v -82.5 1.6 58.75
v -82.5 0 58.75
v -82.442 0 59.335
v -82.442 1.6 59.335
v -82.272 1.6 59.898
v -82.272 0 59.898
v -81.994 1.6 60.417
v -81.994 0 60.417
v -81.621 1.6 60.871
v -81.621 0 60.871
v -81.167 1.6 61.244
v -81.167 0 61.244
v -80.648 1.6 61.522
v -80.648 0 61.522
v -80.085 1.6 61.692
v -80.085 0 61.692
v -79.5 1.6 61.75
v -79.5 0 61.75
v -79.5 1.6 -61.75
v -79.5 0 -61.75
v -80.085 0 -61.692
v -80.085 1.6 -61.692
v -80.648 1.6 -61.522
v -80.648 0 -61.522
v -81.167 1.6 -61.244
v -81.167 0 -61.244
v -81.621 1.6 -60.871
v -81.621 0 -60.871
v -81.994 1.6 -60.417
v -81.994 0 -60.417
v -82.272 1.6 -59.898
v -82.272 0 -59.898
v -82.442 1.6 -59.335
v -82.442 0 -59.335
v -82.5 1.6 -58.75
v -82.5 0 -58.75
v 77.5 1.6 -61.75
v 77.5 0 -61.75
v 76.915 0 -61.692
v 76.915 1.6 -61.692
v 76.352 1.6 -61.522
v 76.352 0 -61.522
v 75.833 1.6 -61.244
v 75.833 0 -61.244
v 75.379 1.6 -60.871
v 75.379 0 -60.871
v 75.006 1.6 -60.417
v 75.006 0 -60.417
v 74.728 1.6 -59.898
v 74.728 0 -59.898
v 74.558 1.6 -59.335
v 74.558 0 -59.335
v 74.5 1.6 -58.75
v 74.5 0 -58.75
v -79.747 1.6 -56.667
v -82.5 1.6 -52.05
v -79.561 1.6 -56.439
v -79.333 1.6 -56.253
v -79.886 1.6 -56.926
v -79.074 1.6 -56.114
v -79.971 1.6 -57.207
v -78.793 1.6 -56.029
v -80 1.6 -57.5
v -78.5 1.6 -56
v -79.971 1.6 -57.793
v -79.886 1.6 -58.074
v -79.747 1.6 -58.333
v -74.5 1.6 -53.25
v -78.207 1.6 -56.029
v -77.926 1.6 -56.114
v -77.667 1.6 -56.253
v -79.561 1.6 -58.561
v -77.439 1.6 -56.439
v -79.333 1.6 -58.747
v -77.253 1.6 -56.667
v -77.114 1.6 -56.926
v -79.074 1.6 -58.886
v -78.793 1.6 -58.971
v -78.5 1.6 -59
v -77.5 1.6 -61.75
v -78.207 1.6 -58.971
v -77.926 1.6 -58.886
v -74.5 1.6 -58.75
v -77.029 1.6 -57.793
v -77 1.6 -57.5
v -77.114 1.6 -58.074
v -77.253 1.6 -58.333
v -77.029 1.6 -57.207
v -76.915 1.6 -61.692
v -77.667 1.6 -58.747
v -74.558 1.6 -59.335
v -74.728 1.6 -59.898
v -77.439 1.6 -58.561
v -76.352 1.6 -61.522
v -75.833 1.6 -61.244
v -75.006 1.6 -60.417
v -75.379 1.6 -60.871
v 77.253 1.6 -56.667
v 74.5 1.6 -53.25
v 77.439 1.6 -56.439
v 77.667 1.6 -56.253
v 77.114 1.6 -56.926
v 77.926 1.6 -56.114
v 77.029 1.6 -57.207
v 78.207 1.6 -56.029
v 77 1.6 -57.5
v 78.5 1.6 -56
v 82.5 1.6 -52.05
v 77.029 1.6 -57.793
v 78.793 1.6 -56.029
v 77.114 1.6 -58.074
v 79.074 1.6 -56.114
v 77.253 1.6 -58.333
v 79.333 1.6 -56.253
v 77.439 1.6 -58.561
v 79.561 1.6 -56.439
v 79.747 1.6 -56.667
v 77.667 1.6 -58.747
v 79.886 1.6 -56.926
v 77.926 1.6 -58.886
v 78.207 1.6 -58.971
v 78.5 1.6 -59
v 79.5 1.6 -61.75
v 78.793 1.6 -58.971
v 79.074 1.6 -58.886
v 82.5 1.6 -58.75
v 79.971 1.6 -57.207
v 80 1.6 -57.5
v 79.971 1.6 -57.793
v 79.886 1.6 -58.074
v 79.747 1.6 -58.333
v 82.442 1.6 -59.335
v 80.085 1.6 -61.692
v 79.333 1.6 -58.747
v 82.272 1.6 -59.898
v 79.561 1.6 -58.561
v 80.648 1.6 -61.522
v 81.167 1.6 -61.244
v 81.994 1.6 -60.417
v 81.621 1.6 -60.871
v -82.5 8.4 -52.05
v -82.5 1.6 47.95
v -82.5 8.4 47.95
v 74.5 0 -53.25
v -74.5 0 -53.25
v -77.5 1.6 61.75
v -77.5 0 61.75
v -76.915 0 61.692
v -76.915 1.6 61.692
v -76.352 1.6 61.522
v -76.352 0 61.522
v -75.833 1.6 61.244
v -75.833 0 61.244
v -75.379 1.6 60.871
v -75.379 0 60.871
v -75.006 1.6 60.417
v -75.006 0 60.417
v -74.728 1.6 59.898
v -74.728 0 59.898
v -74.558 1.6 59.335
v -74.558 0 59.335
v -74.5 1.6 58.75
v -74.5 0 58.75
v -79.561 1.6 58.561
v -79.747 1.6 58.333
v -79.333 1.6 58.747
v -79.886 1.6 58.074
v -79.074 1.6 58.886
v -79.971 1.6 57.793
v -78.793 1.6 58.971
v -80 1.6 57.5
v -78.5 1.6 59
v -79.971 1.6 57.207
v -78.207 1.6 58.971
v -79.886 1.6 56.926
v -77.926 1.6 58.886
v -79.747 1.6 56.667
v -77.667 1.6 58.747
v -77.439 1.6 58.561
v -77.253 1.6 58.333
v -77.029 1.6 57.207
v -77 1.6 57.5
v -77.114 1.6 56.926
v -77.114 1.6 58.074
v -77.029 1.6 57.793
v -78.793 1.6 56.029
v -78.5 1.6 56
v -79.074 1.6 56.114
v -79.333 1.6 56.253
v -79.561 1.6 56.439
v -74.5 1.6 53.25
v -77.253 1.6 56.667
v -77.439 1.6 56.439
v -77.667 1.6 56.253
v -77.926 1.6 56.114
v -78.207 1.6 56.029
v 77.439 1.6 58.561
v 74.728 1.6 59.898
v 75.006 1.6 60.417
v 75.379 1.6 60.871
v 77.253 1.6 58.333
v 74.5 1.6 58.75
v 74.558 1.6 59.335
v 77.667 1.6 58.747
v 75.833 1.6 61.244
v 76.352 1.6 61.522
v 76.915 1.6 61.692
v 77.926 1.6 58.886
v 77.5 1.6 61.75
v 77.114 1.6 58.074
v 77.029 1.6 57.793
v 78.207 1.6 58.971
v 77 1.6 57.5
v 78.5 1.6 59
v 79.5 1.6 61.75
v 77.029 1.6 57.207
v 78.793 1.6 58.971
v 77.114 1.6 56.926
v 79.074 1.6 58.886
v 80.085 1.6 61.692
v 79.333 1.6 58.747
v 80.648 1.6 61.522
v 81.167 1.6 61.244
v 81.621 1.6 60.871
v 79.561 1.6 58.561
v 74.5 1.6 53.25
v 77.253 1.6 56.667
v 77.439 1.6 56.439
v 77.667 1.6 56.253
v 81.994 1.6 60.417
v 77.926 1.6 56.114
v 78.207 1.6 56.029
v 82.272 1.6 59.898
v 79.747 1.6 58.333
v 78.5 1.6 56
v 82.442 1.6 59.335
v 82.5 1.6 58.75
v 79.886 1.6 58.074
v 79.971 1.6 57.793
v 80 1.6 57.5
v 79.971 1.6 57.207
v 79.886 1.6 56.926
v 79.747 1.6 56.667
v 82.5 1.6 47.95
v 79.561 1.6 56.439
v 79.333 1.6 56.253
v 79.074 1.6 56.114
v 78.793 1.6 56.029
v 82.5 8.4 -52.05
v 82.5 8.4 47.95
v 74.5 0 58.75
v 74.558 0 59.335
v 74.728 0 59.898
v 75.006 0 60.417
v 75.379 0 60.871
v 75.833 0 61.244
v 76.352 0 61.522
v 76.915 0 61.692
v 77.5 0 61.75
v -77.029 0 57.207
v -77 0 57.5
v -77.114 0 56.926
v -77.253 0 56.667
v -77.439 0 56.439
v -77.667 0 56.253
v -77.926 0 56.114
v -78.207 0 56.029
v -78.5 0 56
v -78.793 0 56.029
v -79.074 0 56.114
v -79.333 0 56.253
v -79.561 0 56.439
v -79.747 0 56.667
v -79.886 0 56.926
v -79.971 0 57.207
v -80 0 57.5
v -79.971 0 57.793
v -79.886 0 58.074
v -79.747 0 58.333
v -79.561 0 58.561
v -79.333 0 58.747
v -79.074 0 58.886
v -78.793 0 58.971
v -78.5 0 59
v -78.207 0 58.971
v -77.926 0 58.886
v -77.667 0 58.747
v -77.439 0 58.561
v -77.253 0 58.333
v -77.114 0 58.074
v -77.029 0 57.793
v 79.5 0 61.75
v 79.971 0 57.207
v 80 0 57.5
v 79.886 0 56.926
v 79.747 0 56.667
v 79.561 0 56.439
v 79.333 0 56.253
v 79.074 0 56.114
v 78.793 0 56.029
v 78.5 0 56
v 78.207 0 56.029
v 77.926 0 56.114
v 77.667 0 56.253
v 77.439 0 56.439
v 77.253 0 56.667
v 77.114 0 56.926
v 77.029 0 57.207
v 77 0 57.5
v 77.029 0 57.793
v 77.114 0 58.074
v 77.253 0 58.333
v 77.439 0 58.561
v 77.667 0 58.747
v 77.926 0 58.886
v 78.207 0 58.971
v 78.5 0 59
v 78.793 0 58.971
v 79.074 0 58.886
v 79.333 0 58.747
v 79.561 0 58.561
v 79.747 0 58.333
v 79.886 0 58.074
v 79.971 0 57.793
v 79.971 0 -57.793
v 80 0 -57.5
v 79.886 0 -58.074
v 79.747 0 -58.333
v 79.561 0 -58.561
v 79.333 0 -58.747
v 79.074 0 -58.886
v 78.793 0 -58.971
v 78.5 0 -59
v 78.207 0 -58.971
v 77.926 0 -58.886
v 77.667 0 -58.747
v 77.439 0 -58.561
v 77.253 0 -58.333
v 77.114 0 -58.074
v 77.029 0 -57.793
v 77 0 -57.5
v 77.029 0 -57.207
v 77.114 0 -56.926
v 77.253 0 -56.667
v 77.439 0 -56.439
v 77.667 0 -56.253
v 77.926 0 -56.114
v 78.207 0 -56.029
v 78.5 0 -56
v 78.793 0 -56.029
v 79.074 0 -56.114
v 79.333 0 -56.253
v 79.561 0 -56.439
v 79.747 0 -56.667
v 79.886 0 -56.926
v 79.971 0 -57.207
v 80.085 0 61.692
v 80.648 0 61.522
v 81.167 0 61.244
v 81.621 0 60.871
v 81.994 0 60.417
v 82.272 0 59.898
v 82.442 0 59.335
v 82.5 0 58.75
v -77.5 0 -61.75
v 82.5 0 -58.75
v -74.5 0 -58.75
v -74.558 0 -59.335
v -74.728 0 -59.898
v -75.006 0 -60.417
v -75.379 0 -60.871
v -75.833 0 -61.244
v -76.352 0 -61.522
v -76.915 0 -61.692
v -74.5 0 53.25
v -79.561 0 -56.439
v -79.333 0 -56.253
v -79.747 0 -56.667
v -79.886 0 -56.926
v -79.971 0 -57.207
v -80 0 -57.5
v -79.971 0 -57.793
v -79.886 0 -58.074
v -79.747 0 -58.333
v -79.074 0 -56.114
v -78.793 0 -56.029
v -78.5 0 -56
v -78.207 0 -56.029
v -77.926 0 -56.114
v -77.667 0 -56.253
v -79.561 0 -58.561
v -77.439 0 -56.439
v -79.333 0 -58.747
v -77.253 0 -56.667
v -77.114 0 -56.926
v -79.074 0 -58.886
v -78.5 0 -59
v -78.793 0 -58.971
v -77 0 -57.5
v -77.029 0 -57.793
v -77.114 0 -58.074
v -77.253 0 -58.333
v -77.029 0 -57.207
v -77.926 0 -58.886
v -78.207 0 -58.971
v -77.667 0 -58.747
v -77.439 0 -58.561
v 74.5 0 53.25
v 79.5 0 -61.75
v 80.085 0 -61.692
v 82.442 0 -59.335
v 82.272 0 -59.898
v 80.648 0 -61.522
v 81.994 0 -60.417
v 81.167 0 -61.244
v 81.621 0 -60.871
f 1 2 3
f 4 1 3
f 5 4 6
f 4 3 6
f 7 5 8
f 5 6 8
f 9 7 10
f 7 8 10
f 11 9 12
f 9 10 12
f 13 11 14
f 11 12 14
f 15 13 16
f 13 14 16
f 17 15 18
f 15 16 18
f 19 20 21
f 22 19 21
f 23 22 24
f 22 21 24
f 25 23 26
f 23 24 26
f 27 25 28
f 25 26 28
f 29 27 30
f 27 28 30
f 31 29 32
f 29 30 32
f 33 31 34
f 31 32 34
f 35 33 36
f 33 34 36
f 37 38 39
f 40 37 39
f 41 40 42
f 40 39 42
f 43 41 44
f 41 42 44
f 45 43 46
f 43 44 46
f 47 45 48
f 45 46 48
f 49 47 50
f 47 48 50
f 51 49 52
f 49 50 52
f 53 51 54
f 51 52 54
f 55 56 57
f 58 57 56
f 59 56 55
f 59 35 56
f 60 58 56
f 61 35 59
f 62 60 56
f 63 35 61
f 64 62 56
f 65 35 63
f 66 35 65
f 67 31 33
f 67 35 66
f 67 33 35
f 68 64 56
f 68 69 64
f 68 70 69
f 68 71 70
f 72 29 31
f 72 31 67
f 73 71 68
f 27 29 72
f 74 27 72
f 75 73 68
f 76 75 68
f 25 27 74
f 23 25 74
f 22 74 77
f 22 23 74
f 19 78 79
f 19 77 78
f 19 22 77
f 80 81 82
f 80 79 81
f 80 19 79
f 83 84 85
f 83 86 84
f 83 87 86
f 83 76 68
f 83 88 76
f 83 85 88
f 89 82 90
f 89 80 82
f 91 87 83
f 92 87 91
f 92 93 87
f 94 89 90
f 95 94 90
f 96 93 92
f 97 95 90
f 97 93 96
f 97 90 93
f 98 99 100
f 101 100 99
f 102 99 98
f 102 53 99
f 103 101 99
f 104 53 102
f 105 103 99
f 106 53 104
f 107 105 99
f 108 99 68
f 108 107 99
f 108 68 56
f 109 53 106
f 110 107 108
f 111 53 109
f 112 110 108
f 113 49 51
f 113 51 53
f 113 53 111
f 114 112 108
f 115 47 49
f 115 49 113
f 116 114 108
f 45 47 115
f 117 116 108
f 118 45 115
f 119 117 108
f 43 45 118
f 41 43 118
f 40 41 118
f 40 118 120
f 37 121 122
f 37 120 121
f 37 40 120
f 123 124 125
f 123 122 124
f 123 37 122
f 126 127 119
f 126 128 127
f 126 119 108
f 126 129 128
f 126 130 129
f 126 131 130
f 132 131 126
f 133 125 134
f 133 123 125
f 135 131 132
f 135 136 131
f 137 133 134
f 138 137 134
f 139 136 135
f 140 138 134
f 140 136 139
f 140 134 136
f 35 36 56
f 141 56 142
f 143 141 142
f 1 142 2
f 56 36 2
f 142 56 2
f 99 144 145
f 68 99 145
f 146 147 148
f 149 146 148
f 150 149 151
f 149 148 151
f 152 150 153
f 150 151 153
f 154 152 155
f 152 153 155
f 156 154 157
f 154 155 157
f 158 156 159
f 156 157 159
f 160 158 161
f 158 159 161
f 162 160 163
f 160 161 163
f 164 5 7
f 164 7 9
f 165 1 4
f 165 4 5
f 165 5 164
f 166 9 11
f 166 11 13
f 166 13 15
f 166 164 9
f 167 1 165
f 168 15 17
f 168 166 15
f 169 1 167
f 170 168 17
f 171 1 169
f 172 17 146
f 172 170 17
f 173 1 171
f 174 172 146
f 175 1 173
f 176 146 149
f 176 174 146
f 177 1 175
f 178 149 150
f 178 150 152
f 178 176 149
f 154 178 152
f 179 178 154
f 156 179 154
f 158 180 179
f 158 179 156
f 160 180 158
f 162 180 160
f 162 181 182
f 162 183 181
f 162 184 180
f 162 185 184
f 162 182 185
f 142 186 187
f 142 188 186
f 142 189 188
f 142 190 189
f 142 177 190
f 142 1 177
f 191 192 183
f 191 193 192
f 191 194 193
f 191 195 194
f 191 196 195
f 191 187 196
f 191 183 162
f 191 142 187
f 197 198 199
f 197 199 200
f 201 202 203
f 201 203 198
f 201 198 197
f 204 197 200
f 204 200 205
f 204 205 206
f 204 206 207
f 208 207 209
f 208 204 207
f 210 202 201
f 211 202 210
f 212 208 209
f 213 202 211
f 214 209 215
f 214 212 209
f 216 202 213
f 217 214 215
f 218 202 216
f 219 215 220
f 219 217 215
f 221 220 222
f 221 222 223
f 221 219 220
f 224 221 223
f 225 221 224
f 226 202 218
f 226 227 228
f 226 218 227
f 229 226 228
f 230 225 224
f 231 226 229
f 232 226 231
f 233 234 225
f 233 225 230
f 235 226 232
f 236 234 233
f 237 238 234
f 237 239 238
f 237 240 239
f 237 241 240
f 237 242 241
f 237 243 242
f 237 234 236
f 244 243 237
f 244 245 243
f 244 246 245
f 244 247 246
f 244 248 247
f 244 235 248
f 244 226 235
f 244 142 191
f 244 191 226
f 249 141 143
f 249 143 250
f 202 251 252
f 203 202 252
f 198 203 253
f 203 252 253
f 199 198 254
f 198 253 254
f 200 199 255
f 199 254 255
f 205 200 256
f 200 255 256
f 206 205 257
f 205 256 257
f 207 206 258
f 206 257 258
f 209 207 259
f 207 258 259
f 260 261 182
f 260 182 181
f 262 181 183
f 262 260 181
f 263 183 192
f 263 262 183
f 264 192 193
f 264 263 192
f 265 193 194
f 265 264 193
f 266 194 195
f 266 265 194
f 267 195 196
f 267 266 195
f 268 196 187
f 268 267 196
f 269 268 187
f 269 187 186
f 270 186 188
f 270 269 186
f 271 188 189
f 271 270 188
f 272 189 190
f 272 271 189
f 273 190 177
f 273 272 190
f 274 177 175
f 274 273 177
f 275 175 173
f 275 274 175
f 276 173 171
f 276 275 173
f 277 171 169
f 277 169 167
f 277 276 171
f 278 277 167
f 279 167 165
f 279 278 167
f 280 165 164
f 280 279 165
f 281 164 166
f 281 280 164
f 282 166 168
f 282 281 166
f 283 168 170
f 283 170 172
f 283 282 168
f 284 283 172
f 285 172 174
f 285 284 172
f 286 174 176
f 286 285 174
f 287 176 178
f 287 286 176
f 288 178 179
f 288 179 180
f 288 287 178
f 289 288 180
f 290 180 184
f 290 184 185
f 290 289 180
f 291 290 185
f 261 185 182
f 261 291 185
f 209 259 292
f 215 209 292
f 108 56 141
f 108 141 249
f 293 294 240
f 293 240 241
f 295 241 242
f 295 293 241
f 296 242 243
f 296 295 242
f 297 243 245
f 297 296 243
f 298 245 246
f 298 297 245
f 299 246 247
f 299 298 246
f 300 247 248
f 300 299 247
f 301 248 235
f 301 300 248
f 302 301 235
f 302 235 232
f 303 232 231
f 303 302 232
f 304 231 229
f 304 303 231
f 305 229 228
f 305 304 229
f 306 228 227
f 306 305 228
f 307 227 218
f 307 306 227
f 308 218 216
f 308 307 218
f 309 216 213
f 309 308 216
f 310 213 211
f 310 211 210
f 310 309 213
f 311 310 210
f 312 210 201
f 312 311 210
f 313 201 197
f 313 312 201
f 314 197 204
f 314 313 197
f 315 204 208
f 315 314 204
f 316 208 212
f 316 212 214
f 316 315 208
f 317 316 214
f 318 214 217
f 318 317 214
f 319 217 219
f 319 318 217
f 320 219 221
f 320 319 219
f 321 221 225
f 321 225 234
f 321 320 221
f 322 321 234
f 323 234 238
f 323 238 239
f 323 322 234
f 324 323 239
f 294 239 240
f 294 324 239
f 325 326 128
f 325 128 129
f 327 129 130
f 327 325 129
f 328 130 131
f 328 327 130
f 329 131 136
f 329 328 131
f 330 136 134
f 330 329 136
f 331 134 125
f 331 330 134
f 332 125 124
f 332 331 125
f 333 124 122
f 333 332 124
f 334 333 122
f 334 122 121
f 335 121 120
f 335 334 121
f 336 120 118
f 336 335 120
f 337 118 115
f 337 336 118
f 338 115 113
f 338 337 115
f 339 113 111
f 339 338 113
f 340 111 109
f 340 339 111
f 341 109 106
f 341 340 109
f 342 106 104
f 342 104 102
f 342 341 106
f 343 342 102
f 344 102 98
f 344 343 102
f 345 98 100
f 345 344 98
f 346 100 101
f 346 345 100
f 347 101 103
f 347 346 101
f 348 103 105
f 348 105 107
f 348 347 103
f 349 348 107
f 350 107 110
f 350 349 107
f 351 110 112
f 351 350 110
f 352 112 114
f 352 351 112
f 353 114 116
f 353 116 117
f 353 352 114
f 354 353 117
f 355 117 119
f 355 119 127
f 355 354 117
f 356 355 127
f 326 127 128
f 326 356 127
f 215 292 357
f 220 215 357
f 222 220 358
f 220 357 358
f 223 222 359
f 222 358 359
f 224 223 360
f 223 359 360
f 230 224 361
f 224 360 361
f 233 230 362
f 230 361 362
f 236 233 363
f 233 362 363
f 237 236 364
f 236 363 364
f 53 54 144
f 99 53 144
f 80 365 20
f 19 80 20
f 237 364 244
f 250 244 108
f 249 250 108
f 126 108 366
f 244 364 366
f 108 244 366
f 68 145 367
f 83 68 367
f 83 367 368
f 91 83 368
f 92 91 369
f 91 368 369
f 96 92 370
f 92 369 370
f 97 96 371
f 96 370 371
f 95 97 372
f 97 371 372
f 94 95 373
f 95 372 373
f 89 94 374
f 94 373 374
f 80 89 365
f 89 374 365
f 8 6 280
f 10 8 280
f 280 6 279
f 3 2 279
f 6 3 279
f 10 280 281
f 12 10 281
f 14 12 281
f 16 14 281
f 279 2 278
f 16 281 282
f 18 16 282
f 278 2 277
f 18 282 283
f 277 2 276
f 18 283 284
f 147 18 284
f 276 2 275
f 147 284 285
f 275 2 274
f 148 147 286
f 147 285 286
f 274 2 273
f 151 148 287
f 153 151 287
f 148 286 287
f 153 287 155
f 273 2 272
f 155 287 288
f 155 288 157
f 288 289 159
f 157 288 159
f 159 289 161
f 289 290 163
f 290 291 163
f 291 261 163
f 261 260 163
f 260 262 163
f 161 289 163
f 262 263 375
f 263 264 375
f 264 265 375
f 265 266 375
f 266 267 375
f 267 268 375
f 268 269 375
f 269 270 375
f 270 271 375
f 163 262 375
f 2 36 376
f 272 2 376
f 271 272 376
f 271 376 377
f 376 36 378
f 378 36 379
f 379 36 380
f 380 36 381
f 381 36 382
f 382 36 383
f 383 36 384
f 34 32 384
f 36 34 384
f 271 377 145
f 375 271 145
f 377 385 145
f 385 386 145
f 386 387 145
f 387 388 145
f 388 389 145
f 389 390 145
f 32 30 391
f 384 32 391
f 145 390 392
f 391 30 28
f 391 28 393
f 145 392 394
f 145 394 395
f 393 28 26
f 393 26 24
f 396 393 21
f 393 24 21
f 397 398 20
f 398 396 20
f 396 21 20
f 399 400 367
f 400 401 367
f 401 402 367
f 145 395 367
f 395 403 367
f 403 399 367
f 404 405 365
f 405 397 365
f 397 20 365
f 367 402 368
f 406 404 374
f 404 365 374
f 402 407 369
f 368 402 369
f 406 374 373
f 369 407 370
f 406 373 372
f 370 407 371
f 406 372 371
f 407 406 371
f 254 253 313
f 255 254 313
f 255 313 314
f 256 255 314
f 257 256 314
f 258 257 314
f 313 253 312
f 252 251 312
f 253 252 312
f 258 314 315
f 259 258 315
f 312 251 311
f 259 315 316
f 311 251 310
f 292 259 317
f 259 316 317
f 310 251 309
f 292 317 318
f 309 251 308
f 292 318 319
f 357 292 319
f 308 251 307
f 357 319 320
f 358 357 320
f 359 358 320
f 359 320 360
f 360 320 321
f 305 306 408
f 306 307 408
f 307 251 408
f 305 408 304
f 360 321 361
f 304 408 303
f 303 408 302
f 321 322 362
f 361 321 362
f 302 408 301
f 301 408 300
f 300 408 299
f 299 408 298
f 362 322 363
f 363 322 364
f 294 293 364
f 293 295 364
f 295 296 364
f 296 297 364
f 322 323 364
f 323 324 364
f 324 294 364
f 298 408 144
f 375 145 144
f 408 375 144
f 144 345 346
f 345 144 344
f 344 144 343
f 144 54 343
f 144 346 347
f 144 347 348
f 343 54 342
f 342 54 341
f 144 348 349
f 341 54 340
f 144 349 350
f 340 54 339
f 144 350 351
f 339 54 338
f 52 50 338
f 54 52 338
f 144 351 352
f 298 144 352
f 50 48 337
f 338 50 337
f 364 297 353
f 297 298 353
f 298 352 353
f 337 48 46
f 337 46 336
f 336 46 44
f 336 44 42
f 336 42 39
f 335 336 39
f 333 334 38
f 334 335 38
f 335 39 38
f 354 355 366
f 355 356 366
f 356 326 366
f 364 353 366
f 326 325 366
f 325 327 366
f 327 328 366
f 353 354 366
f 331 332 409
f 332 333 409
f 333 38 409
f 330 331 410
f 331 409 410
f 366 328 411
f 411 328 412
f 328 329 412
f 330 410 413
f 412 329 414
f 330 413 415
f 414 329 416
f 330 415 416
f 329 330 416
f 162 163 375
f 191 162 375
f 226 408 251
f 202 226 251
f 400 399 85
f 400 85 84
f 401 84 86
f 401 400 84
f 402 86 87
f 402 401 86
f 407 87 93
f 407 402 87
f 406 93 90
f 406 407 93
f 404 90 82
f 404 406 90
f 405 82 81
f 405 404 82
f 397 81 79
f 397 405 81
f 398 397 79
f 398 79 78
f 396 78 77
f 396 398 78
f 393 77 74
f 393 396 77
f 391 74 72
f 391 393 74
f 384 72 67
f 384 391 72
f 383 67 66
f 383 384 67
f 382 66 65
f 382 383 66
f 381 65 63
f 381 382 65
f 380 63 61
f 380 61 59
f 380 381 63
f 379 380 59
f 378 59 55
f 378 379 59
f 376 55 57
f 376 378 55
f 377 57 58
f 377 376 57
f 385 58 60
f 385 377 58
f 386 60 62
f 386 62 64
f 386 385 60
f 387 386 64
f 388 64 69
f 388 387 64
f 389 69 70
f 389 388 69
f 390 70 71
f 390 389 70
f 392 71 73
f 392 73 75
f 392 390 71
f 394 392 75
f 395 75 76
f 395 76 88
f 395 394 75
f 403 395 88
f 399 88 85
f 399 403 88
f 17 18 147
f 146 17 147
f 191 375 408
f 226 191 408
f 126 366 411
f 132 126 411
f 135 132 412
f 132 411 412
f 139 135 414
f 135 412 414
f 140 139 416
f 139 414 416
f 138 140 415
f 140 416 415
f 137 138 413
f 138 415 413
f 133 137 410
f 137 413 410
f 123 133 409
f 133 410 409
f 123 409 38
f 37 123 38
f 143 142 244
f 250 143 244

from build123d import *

# Parameters (mm, degrees)
CROQUIS1_R              = 1.5
SALIENTE_EXTRUIR1_DEPTH = 1.6
CROQUIS2_W              = 165
CROQUIS2_H              = 100
SALIENTE_EXTRUIR2_DEPTH = 6.8


with BuildPart() as part:
    # Croquis1 → Saliente-Extruir1 (new body)
    with BuildSketch(Plane(origin=(0, 0, 0), x_dir=(1, 0, 0), z_dir=(0, 1, 0))):
        with BuildLine():
            Line((82.5, -58.75), (82.5, 58.75))
            ThreePointArc((82.5, 58.75), (81.621320344, 60.871320344), (79.5, 61.75))
            Line((79.5, 61.75), (77.5, 61.75))
            ThreePointArc((77.5, 61.75), (75.378679656, 60.871320344), (74.5, 58.75))
            Line((74.5, 58.75), (74.5, 53.25))
            Line((74.5, 53.25), (-74.5, 53.25))
            Line((-74.5, 53.25), (-74.5, 58.75))
            ThreePointArc((-74.5, 58.75), (-75.378679656, 60.871320344), (-77.5, 61.75))
            Line((-77.5, 61.75), (-79.5, 61.75))
            ThreePointArc((-79.5, 61.75), (-81.621320344, 60.871320344), (-82.5, 58.75))
            Line((-82.5, 58.75), (-82.5, -58.75))
            ThreePointArc((-82.5, -58.75), (-81.621320344, -60.871320344), (-79.5, -61.75))
            Line((-79.5, -61.75), (-77.5, -61.75))
            ThreePointArc((-77.5, -61.75), (-75.378679656, -60.871320344), (-74.5, -58.75))
            Line((-74.5, -58.75), (-74.5, -53.25))
            Line((-74.5, -53.25), (74.5, -53.25))
            Line((74.5, -53.25), (74.5, -58.75))
            ThreePointArc((74.5, -58.75), (75.378679656, -60.871320344), (77.5, -61.75))
            Line((77.5, -61.75), (79.5, -61.75))
            ThreePointArc((79.5, -61.75), (81.621320344, -60.871320344), (82.5, -58.75))
        make_face()
        with Locations((78.5, 57.5)):
            Circle(CROQUIS1_R, mode=Mode.SUBTRACT)
        with Locations((78.5, -57.5)):
            Circle(CROQUIS1_R, mode=Mode.SUBTRACT)
        with Locations((-78.5, -57.5)):
            Circle(CROQUIS1_R, mode=Mode.SUBTRACT)
        with Locations((-78.5, 57.5)):
            Circle(CROQUIS1_R, mode=Mode.SUBTRACT)
    extrude(amount=SALIENTE_EXTRUIR1_DEPTH)

    # Croquis2 → Saliente-Extruir2 (add)
    with BuildSketch(Plane(origin=(0, 1.6, 0), x_dir=(1, 0, 0), z_dir=(0, 1, 0))):
        with Locations((0, 2.05)):
            Rectangle(CROQUIS2_W, CROQUIS2_H)
    extrude(amount=SALIENTE_EXTRUIR2_DEPTH)


solid = part.part
